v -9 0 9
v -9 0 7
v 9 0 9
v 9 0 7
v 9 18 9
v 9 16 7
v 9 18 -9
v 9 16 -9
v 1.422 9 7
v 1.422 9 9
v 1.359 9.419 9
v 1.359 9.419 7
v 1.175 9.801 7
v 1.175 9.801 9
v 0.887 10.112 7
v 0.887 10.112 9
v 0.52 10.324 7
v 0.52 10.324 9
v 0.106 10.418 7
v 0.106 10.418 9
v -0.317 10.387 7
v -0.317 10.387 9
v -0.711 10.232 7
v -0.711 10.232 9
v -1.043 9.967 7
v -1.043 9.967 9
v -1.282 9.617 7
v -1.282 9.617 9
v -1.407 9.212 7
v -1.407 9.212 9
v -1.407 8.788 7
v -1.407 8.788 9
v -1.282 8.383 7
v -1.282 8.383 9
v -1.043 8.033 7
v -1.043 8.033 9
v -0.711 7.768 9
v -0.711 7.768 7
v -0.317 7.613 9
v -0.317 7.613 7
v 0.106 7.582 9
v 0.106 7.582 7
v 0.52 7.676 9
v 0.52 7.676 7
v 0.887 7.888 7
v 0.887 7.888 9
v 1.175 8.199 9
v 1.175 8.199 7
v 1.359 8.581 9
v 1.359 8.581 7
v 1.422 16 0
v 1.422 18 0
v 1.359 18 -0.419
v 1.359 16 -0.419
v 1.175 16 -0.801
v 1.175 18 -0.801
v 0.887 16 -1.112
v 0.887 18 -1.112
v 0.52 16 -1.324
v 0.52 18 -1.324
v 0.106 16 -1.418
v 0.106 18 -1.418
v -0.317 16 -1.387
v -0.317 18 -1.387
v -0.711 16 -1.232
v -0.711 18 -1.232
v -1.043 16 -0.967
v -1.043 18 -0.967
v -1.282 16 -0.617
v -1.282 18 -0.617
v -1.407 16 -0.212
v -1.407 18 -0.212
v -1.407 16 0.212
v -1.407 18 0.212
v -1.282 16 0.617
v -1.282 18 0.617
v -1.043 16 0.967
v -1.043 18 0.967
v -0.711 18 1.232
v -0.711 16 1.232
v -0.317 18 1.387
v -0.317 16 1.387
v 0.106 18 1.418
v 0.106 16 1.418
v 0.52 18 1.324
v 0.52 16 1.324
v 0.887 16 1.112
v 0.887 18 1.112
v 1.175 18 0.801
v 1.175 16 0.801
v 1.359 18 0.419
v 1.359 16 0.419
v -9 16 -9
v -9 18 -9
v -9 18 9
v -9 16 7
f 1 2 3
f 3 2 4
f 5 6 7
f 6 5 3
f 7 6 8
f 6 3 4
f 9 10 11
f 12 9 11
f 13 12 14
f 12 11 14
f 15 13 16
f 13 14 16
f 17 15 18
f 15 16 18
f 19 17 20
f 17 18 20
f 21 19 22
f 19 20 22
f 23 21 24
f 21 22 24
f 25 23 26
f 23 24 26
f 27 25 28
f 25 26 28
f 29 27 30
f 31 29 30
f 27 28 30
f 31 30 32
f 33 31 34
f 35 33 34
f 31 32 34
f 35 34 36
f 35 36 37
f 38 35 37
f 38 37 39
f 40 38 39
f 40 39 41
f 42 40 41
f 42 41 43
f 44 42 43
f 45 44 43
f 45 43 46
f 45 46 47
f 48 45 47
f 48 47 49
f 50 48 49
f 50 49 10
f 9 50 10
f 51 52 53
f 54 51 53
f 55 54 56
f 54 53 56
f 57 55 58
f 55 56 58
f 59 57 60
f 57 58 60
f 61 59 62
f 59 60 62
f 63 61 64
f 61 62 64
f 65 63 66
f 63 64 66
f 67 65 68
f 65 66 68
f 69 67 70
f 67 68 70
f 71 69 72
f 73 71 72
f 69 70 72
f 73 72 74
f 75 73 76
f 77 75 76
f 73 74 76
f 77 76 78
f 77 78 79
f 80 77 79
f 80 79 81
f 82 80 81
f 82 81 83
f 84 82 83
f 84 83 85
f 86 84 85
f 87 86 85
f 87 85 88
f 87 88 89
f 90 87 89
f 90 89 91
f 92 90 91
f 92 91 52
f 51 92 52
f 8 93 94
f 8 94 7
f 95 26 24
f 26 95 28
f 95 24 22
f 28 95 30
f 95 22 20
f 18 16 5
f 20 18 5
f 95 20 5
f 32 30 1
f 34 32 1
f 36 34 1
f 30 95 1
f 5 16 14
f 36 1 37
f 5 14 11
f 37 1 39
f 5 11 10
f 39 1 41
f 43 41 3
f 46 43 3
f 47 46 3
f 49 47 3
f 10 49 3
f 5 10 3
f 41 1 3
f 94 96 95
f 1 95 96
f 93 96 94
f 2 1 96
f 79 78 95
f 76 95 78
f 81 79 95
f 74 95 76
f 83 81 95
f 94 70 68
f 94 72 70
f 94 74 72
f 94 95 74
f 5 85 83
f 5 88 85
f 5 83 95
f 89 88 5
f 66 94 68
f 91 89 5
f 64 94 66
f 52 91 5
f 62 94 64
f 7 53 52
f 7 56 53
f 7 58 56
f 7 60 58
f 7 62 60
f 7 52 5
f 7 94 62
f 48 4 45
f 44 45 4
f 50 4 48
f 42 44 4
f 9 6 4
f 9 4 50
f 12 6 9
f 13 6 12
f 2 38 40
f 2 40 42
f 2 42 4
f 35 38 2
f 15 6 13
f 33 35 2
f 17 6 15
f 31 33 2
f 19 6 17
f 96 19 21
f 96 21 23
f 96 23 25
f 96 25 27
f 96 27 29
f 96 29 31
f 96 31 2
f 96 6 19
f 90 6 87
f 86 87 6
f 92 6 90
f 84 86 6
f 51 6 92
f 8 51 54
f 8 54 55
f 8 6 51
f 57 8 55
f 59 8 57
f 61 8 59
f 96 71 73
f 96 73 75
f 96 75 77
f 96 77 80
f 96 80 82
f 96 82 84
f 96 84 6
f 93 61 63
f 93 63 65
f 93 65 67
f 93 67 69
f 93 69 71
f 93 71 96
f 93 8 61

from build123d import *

# Parameters (mm, degrees)
SKETCH2_W           = 18
SKETCH2_H           = 18
BOSS_EXTRUDE1_DEPTH = 18
SKETCH3_R           = 1.4224
CUT_EXTRUDE1_DEPTH  = 6.6
SKETCH4_R           = 1.4224
CUT_EXTRUDE2_DEPTH  = 6.6
SKETCH5_R           = 1.4224
CUT_EXTRUDE3_DEPTH  = 6.6
SKETCH6_W           = 16
SKETCH6_H           = 16
CUT_EXTRUDE4_DEPTH  = 16
SKETCH7_W           = 16
SKETCH7_H           = 16
CUT_EXTRUDE5_DEPTH  = 10


with BuildPart() as part:
    # Sketch2 → Boss-Extrude1 (new body)
    with BuildSketch(Plane(origin=(0, 0, 0), x_dir=(1, 0, 0), z_dir=(0, 1, 0))):
        Rectangle(SKETCH2_W, SKETCH2_H)
    extrude(amount=BOSS_EXTRUDE1_DEPTH)

    # Sketch3 → Cut-Extrude1 (cut)
    with BuildSketch(Plane(origin=(0, 18, 0), x_dir=(1, 0, 0), z_dir=(0, 1, 0))):
        Circle(SKETCH3_R)
    extrude(amount=-CUT_EXTRUDE1_DEPTH, mode=Mode.SUBTRACT)

    # Sketch4 → Cut-Extrude2 (cut)
    with BuildSketch(Plane(origin=(9, 0, 0), x_dir=(0, 0, -1), z_dir=(1, 0, 0))):
        with Locations((0, 9)):
            Circle(SKETCH4_R)
    extrude(amount=-CUT_EXTRUDE2_DEPTH, mode=Mode.SUBTRACT)

    # Sketch5 → Cut-Extrude3 (cut)
    with BuildSketch(Plane.XY.offset(9)):
        with Locations((0, 9)):
            Circle(SKETCH5_R)
    extrude(amount=-CUT_EXTRUDE3_DEPTH, mode=Mode.SUBTRACT)

    # Sketch6 → Cut-Extrude4 (cut)
    with BuildSketch(Plane(origin=(0, 0, -9), x_dir=(-1, 0, 0), z_dir=(0, 0, -1))):
        with Locations((1, 8)):
            Rectangle(SKETCH6_W, SKETCH6_H)
    extrude(amount=-CUT_EXTRUDE4_DEPTH, mode=Mode.SUBTRACT)

    # Sketch7 → Cut-Extrude5 (cut)
    with BuildSketch(Plane.ZY.offset(-7)):
        with Locations((-1, 8)):
            Rectangle(SKETCH7_W, SKETCH7_H)
    extrude(amount=-CUT_EXTRUDE5_DEPTH, mode=Mode.SUBTRACT)


solid = part.part
